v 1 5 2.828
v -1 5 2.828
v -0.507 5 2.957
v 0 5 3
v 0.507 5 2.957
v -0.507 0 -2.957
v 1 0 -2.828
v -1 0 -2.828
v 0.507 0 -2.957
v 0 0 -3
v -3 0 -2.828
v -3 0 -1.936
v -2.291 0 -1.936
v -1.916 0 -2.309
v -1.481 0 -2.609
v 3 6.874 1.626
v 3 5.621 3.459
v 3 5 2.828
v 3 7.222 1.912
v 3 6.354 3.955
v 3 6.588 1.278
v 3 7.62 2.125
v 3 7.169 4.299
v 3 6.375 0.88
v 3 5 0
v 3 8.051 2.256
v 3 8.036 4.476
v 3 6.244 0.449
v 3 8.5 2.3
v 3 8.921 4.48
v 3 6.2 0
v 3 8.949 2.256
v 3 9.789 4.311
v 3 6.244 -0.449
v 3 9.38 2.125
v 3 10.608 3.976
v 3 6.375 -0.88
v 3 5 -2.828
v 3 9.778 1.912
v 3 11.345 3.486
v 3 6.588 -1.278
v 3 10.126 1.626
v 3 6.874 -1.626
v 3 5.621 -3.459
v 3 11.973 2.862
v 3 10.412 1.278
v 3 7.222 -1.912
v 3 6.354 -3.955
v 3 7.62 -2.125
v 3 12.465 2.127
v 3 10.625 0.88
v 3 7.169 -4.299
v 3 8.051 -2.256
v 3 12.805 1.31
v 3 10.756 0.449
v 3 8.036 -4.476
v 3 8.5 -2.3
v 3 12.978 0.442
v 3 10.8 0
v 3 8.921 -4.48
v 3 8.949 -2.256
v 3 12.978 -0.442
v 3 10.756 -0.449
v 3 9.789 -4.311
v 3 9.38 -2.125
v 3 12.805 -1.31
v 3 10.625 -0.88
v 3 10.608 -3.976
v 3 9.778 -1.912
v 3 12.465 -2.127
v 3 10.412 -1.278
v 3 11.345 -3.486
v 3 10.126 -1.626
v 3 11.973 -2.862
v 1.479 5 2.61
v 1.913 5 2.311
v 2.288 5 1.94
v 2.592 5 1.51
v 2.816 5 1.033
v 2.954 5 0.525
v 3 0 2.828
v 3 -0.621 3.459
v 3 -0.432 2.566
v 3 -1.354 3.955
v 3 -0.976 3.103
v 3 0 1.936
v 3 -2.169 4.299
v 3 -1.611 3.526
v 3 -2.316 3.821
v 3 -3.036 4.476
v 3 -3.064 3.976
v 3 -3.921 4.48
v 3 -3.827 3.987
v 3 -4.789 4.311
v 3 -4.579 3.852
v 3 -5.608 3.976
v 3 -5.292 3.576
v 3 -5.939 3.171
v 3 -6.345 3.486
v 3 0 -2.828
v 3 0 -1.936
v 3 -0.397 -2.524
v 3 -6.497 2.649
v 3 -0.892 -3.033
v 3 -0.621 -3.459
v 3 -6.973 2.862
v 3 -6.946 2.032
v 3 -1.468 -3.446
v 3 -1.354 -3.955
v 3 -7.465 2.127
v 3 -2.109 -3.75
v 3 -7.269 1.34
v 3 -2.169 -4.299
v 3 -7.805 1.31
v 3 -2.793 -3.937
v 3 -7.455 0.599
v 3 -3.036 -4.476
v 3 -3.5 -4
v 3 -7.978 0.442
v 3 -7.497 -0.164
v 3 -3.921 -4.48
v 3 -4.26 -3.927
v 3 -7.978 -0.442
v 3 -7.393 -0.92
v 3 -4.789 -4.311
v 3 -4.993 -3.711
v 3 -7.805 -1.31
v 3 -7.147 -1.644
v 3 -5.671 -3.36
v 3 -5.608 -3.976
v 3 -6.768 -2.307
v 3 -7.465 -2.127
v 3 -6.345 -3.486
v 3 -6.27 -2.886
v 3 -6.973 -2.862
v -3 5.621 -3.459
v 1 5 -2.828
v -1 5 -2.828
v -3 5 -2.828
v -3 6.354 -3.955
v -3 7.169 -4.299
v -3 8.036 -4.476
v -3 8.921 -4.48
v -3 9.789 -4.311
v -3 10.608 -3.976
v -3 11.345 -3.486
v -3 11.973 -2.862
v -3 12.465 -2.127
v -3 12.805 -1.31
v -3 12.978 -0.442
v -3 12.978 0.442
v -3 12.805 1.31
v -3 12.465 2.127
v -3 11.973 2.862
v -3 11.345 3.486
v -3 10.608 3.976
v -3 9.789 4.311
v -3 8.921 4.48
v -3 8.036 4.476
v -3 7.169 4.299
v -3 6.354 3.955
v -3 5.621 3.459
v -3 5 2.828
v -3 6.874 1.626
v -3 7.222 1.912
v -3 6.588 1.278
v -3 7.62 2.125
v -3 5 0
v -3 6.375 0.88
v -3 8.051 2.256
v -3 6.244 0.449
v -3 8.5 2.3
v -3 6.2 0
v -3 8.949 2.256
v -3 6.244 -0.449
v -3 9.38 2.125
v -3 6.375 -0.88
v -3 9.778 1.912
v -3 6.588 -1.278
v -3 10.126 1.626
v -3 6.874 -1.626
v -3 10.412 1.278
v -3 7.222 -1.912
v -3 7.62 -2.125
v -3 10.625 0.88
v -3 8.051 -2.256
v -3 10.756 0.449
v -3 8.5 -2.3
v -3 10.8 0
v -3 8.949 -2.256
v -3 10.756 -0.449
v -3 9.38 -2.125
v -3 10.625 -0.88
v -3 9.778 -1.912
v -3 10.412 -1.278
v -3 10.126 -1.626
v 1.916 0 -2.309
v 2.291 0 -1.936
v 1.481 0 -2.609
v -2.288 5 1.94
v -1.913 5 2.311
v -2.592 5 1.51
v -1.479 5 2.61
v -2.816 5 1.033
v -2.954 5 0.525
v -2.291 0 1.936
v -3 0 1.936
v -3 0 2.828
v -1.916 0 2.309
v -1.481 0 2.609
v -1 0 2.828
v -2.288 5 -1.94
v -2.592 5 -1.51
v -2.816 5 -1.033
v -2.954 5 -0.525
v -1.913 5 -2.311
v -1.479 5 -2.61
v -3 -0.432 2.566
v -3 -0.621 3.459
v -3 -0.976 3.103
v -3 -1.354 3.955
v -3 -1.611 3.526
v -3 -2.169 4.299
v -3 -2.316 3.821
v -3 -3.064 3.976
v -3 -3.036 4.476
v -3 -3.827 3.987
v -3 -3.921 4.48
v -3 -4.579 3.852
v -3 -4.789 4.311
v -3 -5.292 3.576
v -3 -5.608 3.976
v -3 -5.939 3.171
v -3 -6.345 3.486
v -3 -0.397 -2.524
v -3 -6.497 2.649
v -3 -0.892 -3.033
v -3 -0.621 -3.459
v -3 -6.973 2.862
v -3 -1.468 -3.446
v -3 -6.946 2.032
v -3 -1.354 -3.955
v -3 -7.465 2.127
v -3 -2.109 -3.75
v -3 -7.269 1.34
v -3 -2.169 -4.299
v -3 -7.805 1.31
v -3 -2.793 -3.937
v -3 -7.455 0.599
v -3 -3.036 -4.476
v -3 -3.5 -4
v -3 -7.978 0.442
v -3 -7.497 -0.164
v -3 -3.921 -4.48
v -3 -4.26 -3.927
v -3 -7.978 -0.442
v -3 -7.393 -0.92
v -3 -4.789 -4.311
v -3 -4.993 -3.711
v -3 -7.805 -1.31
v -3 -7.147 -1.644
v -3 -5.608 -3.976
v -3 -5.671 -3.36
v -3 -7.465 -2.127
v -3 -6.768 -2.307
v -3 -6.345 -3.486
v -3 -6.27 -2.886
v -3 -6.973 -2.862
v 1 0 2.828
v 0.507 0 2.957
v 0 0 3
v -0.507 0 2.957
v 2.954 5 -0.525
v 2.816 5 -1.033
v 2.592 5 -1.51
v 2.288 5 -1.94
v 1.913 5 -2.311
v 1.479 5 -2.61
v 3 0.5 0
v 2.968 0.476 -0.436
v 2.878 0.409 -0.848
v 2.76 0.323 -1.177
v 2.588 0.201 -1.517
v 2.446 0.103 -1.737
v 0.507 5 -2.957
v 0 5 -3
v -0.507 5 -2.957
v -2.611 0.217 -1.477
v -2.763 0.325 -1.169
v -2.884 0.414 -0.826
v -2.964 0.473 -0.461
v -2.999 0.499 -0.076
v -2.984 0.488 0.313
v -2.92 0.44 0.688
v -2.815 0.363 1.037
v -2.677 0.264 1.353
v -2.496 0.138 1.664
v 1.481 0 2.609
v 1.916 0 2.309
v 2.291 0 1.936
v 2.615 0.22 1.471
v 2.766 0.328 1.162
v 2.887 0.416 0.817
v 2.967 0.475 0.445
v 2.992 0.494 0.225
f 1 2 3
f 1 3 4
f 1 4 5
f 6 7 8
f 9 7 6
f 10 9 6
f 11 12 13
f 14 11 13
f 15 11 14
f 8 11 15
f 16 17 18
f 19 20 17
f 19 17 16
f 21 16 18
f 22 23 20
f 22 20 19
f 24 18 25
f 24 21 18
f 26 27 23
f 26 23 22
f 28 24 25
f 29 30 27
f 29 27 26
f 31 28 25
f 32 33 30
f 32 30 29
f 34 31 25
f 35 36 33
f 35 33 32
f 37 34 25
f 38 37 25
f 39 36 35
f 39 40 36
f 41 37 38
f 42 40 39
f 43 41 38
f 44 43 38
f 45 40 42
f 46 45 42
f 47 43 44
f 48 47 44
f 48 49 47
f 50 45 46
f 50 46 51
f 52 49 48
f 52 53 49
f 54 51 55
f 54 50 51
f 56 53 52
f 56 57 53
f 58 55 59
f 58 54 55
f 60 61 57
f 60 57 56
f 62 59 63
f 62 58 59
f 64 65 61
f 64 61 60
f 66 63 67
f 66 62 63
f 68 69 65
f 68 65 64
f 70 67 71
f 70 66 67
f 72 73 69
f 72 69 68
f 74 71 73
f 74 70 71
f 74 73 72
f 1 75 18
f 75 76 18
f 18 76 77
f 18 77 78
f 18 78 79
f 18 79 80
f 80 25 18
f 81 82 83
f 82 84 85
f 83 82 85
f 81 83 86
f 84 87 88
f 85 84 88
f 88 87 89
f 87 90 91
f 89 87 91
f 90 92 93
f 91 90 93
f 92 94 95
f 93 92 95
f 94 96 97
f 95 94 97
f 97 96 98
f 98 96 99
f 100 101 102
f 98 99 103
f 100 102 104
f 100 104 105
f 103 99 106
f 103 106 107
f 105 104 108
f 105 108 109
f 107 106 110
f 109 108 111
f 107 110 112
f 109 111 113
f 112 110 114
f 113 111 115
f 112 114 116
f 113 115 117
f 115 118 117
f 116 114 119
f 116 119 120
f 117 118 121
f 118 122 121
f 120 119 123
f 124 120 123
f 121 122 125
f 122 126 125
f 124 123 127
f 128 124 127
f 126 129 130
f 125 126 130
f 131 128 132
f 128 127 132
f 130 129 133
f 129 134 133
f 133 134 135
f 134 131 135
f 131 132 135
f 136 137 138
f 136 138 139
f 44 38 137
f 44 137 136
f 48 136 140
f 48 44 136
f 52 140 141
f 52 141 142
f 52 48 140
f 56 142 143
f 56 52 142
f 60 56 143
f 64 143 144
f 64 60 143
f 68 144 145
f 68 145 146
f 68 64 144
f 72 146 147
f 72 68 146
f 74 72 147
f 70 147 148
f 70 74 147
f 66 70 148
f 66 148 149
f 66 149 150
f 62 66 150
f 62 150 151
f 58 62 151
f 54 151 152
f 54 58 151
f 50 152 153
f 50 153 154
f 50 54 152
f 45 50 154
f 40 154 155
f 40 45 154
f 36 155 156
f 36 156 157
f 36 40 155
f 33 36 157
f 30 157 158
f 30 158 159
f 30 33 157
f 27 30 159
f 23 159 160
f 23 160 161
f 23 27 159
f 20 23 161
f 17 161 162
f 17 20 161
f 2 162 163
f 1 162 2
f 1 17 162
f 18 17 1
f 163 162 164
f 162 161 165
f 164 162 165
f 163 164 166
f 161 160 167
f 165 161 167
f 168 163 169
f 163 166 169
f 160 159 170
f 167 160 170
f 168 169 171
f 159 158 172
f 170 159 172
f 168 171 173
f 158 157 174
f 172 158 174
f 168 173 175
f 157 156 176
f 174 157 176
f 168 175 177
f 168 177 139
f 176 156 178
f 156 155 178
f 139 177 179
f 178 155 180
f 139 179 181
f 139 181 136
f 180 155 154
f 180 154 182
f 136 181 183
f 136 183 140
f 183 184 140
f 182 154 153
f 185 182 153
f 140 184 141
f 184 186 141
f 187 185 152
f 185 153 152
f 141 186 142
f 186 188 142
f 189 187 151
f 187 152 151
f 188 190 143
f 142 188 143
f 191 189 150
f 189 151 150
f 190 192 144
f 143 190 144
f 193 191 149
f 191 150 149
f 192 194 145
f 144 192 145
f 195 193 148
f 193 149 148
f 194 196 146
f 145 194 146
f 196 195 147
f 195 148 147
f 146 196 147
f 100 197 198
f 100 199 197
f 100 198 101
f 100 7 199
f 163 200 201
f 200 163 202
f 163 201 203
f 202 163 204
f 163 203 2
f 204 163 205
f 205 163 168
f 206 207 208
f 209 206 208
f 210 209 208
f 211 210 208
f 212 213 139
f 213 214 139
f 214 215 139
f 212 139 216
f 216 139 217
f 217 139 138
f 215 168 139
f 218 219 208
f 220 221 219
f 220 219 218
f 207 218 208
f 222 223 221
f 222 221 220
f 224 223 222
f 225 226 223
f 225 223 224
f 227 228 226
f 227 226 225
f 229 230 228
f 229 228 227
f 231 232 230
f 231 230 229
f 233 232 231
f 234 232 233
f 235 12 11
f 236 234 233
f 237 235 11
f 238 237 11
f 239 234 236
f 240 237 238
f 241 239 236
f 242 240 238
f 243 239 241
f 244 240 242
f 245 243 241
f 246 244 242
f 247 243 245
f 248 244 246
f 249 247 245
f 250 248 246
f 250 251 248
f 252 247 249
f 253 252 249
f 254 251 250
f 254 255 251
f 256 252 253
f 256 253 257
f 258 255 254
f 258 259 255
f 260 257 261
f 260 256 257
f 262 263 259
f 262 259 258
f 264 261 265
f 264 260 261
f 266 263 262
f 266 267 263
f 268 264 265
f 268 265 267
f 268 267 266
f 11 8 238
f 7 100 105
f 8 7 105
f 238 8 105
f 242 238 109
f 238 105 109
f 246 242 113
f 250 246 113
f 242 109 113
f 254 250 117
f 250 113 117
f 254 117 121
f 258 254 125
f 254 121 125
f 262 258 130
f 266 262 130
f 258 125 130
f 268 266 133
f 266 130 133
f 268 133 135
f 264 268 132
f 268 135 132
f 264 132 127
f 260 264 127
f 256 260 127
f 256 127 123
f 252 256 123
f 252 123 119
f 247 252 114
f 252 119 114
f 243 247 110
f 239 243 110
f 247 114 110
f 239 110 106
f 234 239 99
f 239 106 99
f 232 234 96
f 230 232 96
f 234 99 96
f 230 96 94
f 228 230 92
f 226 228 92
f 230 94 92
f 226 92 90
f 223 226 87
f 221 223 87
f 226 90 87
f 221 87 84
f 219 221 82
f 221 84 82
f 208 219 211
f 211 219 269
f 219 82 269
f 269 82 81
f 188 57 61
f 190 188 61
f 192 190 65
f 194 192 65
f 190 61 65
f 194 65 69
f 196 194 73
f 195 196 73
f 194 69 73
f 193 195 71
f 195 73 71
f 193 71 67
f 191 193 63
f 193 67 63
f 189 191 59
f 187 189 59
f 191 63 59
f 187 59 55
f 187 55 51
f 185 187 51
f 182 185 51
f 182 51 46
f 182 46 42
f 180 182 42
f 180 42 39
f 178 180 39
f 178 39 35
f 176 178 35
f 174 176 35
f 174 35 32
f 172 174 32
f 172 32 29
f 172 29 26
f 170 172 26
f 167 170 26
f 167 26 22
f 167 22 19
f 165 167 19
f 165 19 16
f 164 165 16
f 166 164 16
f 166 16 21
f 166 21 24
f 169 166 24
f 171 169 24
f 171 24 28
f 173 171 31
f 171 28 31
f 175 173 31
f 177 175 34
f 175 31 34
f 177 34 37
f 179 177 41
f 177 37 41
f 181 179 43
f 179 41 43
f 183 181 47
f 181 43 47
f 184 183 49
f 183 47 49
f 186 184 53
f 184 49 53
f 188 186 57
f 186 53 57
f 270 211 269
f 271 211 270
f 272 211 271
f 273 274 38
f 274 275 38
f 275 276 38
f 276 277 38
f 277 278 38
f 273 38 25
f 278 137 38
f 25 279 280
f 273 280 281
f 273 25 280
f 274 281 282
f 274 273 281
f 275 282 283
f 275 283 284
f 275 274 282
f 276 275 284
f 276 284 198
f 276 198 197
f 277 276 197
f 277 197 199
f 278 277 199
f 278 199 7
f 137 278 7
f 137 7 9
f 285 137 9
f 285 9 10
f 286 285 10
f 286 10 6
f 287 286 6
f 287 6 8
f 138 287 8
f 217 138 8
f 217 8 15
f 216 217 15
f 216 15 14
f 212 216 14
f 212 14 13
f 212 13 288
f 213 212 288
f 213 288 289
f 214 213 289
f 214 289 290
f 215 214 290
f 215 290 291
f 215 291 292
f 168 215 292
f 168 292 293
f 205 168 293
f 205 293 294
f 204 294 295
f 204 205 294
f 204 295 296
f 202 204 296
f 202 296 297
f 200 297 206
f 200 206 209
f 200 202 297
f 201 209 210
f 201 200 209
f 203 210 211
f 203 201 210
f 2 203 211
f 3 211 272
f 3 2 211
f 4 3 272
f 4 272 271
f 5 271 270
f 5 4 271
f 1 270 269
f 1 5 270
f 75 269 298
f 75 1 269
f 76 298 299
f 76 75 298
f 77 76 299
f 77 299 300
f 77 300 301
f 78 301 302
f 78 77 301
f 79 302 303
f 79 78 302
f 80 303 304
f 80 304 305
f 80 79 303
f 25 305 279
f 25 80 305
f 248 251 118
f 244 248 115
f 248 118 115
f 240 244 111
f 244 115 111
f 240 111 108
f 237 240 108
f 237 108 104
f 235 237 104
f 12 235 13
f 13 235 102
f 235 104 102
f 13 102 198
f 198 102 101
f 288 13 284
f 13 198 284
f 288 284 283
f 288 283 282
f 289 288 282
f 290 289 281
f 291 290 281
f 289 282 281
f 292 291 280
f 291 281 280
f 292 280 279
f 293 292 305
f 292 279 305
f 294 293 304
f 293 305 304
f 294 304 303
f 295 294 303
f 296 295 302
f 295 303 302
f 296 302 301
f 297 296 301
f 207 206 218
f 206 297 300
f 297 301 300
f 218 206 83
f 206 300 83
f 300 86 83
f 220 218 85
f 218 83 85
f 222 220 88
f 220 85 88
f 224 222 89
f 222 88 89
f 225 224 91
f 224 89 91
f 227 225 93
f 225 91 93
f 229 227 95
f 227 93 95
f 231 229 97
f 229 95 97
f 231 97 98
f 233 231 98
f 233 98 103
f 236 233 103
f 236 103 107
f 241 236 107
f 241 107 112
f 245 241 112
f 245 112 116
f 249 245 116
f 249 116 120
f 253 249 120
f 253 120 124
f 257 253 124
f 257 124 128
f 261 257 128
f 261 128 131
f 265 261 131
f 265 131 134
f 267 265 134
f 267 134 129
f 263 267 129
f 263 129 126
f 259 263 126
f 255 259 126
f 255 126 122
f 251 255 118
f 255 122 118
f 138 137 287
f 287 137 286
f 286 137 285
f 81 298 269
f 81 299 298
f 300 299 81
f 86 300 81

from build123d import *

# Parameters (mm, degrees)
SKETCH1_R            = 3
CRANK_BODY_DEPTH     = 4.5
PIN_SHAFT_BODY_DEPTH = 3
SKETCH4_R            = 2.3
PIN_SHAFT_DEPTH      = 7
SKETCH1_2_OUTSIDE_W  = 11.382
SKETCH1_2_OUTSIDE_H  = 14.382
SKETCH1_2_OUTSIDE_R  = 3
SMOOTHING_CUTS_DEPTH = 5
SKETCH5_R            = 4
CUT_EXTRUDE1_DEPTH   = 7


with BuildPart() as part:
    # Sketch1 → crank_body (new body)
    with BuildSketch(Plane(origin=(0, 0, 0), x_dir=(1, 0, 0), z_dir=(0, 1, 0))):
        Circle(SKETCH1_R)
    extrude(amount=CRANK_BODY_DEPTH)

    # Sketch3 → pin_shaft_body (add, symmetric)
    with BuildSketch(Plane(origin=(0, 0, 0), x_dir=(0, 0, -1), z_dir=(1, 0, 0))):
        with BuildLine():
            Line((-3, 5), (-3, 4.5))
            Line((-3, 4.5), (3, 4.5))
            Line((3, 4.5), (3, 5))
            Line((3, 5), (2.828427125, 5))
            ThreePointArc((2.828427125, 5), (0, 13), (-2.828427125, 5))
            Line((-2.828427125, 5), (-3, 5))
        make_face()
    pin_shaft_body = extrude(amount=PIN_SHAFT_BODY_DEPTH, both=True)

    # Sketch4 → pin_shaft (cut, through all)
    with BuildSketch(Plane(origin=(3, 0, 0), x_dir=(0, 0, -1), z_dir=(1, 0, 0))):
        with Locations((0, 8.5)):
            Circle(SKETCH4_R)
    extrude(amount=-PIN_SHAFT_DEPTH, mode=Mode.SUBTRACT)

    # Sketch1<2> outside → smoothing_cuts (cut)
    with BuildSketch(Plane(origin=(0, 0, 0), x_dir=(1, 0, 0), z_dir=(0, 1, 0))):
        Rectangle(SKETCH1_2_OUTSIDE_W, SKETCH1_2_OUTSIDE_H)
        Circle(SKETCH1_2_OUTSIDE_R, mode=Mode.SUBTRACT)
    smoothing_cuts = extrude(amount=SMOOTHING_CUTS_DEPTH, mode=Mode.SUBTRACT)

    # Mirror1: pin_shaft_body, smoothing_cuts across plane
    add(pin_shaft_body.mirror(Plane(origin=(0, 2.5, 0), x_dir=(0, 0, 1), z_dir=(0, -1, 0))))
    add(smoothing_cuts.mirror(Plane(origin=(0, 2.5, 0), x_dir=(0, 0, 1), z_dir=(0, -1, 0))), mode=Mode.SUBTRACT)

    # Sketch5 → Cut-Extrude1 (cut, through all)
    with BuildSketch(Plane(origin=(3, 0, 0), x_dir=(0, 0, -1), z_dir=(1, 0, 0))):
        with Locations((0, -3.5)):
            Circle(SKETCH5_R)
    extrude(amount=-CUT_EXTRUDE1_DEPTH, mode=Mode.SUBTRACT)


solid = part.part
